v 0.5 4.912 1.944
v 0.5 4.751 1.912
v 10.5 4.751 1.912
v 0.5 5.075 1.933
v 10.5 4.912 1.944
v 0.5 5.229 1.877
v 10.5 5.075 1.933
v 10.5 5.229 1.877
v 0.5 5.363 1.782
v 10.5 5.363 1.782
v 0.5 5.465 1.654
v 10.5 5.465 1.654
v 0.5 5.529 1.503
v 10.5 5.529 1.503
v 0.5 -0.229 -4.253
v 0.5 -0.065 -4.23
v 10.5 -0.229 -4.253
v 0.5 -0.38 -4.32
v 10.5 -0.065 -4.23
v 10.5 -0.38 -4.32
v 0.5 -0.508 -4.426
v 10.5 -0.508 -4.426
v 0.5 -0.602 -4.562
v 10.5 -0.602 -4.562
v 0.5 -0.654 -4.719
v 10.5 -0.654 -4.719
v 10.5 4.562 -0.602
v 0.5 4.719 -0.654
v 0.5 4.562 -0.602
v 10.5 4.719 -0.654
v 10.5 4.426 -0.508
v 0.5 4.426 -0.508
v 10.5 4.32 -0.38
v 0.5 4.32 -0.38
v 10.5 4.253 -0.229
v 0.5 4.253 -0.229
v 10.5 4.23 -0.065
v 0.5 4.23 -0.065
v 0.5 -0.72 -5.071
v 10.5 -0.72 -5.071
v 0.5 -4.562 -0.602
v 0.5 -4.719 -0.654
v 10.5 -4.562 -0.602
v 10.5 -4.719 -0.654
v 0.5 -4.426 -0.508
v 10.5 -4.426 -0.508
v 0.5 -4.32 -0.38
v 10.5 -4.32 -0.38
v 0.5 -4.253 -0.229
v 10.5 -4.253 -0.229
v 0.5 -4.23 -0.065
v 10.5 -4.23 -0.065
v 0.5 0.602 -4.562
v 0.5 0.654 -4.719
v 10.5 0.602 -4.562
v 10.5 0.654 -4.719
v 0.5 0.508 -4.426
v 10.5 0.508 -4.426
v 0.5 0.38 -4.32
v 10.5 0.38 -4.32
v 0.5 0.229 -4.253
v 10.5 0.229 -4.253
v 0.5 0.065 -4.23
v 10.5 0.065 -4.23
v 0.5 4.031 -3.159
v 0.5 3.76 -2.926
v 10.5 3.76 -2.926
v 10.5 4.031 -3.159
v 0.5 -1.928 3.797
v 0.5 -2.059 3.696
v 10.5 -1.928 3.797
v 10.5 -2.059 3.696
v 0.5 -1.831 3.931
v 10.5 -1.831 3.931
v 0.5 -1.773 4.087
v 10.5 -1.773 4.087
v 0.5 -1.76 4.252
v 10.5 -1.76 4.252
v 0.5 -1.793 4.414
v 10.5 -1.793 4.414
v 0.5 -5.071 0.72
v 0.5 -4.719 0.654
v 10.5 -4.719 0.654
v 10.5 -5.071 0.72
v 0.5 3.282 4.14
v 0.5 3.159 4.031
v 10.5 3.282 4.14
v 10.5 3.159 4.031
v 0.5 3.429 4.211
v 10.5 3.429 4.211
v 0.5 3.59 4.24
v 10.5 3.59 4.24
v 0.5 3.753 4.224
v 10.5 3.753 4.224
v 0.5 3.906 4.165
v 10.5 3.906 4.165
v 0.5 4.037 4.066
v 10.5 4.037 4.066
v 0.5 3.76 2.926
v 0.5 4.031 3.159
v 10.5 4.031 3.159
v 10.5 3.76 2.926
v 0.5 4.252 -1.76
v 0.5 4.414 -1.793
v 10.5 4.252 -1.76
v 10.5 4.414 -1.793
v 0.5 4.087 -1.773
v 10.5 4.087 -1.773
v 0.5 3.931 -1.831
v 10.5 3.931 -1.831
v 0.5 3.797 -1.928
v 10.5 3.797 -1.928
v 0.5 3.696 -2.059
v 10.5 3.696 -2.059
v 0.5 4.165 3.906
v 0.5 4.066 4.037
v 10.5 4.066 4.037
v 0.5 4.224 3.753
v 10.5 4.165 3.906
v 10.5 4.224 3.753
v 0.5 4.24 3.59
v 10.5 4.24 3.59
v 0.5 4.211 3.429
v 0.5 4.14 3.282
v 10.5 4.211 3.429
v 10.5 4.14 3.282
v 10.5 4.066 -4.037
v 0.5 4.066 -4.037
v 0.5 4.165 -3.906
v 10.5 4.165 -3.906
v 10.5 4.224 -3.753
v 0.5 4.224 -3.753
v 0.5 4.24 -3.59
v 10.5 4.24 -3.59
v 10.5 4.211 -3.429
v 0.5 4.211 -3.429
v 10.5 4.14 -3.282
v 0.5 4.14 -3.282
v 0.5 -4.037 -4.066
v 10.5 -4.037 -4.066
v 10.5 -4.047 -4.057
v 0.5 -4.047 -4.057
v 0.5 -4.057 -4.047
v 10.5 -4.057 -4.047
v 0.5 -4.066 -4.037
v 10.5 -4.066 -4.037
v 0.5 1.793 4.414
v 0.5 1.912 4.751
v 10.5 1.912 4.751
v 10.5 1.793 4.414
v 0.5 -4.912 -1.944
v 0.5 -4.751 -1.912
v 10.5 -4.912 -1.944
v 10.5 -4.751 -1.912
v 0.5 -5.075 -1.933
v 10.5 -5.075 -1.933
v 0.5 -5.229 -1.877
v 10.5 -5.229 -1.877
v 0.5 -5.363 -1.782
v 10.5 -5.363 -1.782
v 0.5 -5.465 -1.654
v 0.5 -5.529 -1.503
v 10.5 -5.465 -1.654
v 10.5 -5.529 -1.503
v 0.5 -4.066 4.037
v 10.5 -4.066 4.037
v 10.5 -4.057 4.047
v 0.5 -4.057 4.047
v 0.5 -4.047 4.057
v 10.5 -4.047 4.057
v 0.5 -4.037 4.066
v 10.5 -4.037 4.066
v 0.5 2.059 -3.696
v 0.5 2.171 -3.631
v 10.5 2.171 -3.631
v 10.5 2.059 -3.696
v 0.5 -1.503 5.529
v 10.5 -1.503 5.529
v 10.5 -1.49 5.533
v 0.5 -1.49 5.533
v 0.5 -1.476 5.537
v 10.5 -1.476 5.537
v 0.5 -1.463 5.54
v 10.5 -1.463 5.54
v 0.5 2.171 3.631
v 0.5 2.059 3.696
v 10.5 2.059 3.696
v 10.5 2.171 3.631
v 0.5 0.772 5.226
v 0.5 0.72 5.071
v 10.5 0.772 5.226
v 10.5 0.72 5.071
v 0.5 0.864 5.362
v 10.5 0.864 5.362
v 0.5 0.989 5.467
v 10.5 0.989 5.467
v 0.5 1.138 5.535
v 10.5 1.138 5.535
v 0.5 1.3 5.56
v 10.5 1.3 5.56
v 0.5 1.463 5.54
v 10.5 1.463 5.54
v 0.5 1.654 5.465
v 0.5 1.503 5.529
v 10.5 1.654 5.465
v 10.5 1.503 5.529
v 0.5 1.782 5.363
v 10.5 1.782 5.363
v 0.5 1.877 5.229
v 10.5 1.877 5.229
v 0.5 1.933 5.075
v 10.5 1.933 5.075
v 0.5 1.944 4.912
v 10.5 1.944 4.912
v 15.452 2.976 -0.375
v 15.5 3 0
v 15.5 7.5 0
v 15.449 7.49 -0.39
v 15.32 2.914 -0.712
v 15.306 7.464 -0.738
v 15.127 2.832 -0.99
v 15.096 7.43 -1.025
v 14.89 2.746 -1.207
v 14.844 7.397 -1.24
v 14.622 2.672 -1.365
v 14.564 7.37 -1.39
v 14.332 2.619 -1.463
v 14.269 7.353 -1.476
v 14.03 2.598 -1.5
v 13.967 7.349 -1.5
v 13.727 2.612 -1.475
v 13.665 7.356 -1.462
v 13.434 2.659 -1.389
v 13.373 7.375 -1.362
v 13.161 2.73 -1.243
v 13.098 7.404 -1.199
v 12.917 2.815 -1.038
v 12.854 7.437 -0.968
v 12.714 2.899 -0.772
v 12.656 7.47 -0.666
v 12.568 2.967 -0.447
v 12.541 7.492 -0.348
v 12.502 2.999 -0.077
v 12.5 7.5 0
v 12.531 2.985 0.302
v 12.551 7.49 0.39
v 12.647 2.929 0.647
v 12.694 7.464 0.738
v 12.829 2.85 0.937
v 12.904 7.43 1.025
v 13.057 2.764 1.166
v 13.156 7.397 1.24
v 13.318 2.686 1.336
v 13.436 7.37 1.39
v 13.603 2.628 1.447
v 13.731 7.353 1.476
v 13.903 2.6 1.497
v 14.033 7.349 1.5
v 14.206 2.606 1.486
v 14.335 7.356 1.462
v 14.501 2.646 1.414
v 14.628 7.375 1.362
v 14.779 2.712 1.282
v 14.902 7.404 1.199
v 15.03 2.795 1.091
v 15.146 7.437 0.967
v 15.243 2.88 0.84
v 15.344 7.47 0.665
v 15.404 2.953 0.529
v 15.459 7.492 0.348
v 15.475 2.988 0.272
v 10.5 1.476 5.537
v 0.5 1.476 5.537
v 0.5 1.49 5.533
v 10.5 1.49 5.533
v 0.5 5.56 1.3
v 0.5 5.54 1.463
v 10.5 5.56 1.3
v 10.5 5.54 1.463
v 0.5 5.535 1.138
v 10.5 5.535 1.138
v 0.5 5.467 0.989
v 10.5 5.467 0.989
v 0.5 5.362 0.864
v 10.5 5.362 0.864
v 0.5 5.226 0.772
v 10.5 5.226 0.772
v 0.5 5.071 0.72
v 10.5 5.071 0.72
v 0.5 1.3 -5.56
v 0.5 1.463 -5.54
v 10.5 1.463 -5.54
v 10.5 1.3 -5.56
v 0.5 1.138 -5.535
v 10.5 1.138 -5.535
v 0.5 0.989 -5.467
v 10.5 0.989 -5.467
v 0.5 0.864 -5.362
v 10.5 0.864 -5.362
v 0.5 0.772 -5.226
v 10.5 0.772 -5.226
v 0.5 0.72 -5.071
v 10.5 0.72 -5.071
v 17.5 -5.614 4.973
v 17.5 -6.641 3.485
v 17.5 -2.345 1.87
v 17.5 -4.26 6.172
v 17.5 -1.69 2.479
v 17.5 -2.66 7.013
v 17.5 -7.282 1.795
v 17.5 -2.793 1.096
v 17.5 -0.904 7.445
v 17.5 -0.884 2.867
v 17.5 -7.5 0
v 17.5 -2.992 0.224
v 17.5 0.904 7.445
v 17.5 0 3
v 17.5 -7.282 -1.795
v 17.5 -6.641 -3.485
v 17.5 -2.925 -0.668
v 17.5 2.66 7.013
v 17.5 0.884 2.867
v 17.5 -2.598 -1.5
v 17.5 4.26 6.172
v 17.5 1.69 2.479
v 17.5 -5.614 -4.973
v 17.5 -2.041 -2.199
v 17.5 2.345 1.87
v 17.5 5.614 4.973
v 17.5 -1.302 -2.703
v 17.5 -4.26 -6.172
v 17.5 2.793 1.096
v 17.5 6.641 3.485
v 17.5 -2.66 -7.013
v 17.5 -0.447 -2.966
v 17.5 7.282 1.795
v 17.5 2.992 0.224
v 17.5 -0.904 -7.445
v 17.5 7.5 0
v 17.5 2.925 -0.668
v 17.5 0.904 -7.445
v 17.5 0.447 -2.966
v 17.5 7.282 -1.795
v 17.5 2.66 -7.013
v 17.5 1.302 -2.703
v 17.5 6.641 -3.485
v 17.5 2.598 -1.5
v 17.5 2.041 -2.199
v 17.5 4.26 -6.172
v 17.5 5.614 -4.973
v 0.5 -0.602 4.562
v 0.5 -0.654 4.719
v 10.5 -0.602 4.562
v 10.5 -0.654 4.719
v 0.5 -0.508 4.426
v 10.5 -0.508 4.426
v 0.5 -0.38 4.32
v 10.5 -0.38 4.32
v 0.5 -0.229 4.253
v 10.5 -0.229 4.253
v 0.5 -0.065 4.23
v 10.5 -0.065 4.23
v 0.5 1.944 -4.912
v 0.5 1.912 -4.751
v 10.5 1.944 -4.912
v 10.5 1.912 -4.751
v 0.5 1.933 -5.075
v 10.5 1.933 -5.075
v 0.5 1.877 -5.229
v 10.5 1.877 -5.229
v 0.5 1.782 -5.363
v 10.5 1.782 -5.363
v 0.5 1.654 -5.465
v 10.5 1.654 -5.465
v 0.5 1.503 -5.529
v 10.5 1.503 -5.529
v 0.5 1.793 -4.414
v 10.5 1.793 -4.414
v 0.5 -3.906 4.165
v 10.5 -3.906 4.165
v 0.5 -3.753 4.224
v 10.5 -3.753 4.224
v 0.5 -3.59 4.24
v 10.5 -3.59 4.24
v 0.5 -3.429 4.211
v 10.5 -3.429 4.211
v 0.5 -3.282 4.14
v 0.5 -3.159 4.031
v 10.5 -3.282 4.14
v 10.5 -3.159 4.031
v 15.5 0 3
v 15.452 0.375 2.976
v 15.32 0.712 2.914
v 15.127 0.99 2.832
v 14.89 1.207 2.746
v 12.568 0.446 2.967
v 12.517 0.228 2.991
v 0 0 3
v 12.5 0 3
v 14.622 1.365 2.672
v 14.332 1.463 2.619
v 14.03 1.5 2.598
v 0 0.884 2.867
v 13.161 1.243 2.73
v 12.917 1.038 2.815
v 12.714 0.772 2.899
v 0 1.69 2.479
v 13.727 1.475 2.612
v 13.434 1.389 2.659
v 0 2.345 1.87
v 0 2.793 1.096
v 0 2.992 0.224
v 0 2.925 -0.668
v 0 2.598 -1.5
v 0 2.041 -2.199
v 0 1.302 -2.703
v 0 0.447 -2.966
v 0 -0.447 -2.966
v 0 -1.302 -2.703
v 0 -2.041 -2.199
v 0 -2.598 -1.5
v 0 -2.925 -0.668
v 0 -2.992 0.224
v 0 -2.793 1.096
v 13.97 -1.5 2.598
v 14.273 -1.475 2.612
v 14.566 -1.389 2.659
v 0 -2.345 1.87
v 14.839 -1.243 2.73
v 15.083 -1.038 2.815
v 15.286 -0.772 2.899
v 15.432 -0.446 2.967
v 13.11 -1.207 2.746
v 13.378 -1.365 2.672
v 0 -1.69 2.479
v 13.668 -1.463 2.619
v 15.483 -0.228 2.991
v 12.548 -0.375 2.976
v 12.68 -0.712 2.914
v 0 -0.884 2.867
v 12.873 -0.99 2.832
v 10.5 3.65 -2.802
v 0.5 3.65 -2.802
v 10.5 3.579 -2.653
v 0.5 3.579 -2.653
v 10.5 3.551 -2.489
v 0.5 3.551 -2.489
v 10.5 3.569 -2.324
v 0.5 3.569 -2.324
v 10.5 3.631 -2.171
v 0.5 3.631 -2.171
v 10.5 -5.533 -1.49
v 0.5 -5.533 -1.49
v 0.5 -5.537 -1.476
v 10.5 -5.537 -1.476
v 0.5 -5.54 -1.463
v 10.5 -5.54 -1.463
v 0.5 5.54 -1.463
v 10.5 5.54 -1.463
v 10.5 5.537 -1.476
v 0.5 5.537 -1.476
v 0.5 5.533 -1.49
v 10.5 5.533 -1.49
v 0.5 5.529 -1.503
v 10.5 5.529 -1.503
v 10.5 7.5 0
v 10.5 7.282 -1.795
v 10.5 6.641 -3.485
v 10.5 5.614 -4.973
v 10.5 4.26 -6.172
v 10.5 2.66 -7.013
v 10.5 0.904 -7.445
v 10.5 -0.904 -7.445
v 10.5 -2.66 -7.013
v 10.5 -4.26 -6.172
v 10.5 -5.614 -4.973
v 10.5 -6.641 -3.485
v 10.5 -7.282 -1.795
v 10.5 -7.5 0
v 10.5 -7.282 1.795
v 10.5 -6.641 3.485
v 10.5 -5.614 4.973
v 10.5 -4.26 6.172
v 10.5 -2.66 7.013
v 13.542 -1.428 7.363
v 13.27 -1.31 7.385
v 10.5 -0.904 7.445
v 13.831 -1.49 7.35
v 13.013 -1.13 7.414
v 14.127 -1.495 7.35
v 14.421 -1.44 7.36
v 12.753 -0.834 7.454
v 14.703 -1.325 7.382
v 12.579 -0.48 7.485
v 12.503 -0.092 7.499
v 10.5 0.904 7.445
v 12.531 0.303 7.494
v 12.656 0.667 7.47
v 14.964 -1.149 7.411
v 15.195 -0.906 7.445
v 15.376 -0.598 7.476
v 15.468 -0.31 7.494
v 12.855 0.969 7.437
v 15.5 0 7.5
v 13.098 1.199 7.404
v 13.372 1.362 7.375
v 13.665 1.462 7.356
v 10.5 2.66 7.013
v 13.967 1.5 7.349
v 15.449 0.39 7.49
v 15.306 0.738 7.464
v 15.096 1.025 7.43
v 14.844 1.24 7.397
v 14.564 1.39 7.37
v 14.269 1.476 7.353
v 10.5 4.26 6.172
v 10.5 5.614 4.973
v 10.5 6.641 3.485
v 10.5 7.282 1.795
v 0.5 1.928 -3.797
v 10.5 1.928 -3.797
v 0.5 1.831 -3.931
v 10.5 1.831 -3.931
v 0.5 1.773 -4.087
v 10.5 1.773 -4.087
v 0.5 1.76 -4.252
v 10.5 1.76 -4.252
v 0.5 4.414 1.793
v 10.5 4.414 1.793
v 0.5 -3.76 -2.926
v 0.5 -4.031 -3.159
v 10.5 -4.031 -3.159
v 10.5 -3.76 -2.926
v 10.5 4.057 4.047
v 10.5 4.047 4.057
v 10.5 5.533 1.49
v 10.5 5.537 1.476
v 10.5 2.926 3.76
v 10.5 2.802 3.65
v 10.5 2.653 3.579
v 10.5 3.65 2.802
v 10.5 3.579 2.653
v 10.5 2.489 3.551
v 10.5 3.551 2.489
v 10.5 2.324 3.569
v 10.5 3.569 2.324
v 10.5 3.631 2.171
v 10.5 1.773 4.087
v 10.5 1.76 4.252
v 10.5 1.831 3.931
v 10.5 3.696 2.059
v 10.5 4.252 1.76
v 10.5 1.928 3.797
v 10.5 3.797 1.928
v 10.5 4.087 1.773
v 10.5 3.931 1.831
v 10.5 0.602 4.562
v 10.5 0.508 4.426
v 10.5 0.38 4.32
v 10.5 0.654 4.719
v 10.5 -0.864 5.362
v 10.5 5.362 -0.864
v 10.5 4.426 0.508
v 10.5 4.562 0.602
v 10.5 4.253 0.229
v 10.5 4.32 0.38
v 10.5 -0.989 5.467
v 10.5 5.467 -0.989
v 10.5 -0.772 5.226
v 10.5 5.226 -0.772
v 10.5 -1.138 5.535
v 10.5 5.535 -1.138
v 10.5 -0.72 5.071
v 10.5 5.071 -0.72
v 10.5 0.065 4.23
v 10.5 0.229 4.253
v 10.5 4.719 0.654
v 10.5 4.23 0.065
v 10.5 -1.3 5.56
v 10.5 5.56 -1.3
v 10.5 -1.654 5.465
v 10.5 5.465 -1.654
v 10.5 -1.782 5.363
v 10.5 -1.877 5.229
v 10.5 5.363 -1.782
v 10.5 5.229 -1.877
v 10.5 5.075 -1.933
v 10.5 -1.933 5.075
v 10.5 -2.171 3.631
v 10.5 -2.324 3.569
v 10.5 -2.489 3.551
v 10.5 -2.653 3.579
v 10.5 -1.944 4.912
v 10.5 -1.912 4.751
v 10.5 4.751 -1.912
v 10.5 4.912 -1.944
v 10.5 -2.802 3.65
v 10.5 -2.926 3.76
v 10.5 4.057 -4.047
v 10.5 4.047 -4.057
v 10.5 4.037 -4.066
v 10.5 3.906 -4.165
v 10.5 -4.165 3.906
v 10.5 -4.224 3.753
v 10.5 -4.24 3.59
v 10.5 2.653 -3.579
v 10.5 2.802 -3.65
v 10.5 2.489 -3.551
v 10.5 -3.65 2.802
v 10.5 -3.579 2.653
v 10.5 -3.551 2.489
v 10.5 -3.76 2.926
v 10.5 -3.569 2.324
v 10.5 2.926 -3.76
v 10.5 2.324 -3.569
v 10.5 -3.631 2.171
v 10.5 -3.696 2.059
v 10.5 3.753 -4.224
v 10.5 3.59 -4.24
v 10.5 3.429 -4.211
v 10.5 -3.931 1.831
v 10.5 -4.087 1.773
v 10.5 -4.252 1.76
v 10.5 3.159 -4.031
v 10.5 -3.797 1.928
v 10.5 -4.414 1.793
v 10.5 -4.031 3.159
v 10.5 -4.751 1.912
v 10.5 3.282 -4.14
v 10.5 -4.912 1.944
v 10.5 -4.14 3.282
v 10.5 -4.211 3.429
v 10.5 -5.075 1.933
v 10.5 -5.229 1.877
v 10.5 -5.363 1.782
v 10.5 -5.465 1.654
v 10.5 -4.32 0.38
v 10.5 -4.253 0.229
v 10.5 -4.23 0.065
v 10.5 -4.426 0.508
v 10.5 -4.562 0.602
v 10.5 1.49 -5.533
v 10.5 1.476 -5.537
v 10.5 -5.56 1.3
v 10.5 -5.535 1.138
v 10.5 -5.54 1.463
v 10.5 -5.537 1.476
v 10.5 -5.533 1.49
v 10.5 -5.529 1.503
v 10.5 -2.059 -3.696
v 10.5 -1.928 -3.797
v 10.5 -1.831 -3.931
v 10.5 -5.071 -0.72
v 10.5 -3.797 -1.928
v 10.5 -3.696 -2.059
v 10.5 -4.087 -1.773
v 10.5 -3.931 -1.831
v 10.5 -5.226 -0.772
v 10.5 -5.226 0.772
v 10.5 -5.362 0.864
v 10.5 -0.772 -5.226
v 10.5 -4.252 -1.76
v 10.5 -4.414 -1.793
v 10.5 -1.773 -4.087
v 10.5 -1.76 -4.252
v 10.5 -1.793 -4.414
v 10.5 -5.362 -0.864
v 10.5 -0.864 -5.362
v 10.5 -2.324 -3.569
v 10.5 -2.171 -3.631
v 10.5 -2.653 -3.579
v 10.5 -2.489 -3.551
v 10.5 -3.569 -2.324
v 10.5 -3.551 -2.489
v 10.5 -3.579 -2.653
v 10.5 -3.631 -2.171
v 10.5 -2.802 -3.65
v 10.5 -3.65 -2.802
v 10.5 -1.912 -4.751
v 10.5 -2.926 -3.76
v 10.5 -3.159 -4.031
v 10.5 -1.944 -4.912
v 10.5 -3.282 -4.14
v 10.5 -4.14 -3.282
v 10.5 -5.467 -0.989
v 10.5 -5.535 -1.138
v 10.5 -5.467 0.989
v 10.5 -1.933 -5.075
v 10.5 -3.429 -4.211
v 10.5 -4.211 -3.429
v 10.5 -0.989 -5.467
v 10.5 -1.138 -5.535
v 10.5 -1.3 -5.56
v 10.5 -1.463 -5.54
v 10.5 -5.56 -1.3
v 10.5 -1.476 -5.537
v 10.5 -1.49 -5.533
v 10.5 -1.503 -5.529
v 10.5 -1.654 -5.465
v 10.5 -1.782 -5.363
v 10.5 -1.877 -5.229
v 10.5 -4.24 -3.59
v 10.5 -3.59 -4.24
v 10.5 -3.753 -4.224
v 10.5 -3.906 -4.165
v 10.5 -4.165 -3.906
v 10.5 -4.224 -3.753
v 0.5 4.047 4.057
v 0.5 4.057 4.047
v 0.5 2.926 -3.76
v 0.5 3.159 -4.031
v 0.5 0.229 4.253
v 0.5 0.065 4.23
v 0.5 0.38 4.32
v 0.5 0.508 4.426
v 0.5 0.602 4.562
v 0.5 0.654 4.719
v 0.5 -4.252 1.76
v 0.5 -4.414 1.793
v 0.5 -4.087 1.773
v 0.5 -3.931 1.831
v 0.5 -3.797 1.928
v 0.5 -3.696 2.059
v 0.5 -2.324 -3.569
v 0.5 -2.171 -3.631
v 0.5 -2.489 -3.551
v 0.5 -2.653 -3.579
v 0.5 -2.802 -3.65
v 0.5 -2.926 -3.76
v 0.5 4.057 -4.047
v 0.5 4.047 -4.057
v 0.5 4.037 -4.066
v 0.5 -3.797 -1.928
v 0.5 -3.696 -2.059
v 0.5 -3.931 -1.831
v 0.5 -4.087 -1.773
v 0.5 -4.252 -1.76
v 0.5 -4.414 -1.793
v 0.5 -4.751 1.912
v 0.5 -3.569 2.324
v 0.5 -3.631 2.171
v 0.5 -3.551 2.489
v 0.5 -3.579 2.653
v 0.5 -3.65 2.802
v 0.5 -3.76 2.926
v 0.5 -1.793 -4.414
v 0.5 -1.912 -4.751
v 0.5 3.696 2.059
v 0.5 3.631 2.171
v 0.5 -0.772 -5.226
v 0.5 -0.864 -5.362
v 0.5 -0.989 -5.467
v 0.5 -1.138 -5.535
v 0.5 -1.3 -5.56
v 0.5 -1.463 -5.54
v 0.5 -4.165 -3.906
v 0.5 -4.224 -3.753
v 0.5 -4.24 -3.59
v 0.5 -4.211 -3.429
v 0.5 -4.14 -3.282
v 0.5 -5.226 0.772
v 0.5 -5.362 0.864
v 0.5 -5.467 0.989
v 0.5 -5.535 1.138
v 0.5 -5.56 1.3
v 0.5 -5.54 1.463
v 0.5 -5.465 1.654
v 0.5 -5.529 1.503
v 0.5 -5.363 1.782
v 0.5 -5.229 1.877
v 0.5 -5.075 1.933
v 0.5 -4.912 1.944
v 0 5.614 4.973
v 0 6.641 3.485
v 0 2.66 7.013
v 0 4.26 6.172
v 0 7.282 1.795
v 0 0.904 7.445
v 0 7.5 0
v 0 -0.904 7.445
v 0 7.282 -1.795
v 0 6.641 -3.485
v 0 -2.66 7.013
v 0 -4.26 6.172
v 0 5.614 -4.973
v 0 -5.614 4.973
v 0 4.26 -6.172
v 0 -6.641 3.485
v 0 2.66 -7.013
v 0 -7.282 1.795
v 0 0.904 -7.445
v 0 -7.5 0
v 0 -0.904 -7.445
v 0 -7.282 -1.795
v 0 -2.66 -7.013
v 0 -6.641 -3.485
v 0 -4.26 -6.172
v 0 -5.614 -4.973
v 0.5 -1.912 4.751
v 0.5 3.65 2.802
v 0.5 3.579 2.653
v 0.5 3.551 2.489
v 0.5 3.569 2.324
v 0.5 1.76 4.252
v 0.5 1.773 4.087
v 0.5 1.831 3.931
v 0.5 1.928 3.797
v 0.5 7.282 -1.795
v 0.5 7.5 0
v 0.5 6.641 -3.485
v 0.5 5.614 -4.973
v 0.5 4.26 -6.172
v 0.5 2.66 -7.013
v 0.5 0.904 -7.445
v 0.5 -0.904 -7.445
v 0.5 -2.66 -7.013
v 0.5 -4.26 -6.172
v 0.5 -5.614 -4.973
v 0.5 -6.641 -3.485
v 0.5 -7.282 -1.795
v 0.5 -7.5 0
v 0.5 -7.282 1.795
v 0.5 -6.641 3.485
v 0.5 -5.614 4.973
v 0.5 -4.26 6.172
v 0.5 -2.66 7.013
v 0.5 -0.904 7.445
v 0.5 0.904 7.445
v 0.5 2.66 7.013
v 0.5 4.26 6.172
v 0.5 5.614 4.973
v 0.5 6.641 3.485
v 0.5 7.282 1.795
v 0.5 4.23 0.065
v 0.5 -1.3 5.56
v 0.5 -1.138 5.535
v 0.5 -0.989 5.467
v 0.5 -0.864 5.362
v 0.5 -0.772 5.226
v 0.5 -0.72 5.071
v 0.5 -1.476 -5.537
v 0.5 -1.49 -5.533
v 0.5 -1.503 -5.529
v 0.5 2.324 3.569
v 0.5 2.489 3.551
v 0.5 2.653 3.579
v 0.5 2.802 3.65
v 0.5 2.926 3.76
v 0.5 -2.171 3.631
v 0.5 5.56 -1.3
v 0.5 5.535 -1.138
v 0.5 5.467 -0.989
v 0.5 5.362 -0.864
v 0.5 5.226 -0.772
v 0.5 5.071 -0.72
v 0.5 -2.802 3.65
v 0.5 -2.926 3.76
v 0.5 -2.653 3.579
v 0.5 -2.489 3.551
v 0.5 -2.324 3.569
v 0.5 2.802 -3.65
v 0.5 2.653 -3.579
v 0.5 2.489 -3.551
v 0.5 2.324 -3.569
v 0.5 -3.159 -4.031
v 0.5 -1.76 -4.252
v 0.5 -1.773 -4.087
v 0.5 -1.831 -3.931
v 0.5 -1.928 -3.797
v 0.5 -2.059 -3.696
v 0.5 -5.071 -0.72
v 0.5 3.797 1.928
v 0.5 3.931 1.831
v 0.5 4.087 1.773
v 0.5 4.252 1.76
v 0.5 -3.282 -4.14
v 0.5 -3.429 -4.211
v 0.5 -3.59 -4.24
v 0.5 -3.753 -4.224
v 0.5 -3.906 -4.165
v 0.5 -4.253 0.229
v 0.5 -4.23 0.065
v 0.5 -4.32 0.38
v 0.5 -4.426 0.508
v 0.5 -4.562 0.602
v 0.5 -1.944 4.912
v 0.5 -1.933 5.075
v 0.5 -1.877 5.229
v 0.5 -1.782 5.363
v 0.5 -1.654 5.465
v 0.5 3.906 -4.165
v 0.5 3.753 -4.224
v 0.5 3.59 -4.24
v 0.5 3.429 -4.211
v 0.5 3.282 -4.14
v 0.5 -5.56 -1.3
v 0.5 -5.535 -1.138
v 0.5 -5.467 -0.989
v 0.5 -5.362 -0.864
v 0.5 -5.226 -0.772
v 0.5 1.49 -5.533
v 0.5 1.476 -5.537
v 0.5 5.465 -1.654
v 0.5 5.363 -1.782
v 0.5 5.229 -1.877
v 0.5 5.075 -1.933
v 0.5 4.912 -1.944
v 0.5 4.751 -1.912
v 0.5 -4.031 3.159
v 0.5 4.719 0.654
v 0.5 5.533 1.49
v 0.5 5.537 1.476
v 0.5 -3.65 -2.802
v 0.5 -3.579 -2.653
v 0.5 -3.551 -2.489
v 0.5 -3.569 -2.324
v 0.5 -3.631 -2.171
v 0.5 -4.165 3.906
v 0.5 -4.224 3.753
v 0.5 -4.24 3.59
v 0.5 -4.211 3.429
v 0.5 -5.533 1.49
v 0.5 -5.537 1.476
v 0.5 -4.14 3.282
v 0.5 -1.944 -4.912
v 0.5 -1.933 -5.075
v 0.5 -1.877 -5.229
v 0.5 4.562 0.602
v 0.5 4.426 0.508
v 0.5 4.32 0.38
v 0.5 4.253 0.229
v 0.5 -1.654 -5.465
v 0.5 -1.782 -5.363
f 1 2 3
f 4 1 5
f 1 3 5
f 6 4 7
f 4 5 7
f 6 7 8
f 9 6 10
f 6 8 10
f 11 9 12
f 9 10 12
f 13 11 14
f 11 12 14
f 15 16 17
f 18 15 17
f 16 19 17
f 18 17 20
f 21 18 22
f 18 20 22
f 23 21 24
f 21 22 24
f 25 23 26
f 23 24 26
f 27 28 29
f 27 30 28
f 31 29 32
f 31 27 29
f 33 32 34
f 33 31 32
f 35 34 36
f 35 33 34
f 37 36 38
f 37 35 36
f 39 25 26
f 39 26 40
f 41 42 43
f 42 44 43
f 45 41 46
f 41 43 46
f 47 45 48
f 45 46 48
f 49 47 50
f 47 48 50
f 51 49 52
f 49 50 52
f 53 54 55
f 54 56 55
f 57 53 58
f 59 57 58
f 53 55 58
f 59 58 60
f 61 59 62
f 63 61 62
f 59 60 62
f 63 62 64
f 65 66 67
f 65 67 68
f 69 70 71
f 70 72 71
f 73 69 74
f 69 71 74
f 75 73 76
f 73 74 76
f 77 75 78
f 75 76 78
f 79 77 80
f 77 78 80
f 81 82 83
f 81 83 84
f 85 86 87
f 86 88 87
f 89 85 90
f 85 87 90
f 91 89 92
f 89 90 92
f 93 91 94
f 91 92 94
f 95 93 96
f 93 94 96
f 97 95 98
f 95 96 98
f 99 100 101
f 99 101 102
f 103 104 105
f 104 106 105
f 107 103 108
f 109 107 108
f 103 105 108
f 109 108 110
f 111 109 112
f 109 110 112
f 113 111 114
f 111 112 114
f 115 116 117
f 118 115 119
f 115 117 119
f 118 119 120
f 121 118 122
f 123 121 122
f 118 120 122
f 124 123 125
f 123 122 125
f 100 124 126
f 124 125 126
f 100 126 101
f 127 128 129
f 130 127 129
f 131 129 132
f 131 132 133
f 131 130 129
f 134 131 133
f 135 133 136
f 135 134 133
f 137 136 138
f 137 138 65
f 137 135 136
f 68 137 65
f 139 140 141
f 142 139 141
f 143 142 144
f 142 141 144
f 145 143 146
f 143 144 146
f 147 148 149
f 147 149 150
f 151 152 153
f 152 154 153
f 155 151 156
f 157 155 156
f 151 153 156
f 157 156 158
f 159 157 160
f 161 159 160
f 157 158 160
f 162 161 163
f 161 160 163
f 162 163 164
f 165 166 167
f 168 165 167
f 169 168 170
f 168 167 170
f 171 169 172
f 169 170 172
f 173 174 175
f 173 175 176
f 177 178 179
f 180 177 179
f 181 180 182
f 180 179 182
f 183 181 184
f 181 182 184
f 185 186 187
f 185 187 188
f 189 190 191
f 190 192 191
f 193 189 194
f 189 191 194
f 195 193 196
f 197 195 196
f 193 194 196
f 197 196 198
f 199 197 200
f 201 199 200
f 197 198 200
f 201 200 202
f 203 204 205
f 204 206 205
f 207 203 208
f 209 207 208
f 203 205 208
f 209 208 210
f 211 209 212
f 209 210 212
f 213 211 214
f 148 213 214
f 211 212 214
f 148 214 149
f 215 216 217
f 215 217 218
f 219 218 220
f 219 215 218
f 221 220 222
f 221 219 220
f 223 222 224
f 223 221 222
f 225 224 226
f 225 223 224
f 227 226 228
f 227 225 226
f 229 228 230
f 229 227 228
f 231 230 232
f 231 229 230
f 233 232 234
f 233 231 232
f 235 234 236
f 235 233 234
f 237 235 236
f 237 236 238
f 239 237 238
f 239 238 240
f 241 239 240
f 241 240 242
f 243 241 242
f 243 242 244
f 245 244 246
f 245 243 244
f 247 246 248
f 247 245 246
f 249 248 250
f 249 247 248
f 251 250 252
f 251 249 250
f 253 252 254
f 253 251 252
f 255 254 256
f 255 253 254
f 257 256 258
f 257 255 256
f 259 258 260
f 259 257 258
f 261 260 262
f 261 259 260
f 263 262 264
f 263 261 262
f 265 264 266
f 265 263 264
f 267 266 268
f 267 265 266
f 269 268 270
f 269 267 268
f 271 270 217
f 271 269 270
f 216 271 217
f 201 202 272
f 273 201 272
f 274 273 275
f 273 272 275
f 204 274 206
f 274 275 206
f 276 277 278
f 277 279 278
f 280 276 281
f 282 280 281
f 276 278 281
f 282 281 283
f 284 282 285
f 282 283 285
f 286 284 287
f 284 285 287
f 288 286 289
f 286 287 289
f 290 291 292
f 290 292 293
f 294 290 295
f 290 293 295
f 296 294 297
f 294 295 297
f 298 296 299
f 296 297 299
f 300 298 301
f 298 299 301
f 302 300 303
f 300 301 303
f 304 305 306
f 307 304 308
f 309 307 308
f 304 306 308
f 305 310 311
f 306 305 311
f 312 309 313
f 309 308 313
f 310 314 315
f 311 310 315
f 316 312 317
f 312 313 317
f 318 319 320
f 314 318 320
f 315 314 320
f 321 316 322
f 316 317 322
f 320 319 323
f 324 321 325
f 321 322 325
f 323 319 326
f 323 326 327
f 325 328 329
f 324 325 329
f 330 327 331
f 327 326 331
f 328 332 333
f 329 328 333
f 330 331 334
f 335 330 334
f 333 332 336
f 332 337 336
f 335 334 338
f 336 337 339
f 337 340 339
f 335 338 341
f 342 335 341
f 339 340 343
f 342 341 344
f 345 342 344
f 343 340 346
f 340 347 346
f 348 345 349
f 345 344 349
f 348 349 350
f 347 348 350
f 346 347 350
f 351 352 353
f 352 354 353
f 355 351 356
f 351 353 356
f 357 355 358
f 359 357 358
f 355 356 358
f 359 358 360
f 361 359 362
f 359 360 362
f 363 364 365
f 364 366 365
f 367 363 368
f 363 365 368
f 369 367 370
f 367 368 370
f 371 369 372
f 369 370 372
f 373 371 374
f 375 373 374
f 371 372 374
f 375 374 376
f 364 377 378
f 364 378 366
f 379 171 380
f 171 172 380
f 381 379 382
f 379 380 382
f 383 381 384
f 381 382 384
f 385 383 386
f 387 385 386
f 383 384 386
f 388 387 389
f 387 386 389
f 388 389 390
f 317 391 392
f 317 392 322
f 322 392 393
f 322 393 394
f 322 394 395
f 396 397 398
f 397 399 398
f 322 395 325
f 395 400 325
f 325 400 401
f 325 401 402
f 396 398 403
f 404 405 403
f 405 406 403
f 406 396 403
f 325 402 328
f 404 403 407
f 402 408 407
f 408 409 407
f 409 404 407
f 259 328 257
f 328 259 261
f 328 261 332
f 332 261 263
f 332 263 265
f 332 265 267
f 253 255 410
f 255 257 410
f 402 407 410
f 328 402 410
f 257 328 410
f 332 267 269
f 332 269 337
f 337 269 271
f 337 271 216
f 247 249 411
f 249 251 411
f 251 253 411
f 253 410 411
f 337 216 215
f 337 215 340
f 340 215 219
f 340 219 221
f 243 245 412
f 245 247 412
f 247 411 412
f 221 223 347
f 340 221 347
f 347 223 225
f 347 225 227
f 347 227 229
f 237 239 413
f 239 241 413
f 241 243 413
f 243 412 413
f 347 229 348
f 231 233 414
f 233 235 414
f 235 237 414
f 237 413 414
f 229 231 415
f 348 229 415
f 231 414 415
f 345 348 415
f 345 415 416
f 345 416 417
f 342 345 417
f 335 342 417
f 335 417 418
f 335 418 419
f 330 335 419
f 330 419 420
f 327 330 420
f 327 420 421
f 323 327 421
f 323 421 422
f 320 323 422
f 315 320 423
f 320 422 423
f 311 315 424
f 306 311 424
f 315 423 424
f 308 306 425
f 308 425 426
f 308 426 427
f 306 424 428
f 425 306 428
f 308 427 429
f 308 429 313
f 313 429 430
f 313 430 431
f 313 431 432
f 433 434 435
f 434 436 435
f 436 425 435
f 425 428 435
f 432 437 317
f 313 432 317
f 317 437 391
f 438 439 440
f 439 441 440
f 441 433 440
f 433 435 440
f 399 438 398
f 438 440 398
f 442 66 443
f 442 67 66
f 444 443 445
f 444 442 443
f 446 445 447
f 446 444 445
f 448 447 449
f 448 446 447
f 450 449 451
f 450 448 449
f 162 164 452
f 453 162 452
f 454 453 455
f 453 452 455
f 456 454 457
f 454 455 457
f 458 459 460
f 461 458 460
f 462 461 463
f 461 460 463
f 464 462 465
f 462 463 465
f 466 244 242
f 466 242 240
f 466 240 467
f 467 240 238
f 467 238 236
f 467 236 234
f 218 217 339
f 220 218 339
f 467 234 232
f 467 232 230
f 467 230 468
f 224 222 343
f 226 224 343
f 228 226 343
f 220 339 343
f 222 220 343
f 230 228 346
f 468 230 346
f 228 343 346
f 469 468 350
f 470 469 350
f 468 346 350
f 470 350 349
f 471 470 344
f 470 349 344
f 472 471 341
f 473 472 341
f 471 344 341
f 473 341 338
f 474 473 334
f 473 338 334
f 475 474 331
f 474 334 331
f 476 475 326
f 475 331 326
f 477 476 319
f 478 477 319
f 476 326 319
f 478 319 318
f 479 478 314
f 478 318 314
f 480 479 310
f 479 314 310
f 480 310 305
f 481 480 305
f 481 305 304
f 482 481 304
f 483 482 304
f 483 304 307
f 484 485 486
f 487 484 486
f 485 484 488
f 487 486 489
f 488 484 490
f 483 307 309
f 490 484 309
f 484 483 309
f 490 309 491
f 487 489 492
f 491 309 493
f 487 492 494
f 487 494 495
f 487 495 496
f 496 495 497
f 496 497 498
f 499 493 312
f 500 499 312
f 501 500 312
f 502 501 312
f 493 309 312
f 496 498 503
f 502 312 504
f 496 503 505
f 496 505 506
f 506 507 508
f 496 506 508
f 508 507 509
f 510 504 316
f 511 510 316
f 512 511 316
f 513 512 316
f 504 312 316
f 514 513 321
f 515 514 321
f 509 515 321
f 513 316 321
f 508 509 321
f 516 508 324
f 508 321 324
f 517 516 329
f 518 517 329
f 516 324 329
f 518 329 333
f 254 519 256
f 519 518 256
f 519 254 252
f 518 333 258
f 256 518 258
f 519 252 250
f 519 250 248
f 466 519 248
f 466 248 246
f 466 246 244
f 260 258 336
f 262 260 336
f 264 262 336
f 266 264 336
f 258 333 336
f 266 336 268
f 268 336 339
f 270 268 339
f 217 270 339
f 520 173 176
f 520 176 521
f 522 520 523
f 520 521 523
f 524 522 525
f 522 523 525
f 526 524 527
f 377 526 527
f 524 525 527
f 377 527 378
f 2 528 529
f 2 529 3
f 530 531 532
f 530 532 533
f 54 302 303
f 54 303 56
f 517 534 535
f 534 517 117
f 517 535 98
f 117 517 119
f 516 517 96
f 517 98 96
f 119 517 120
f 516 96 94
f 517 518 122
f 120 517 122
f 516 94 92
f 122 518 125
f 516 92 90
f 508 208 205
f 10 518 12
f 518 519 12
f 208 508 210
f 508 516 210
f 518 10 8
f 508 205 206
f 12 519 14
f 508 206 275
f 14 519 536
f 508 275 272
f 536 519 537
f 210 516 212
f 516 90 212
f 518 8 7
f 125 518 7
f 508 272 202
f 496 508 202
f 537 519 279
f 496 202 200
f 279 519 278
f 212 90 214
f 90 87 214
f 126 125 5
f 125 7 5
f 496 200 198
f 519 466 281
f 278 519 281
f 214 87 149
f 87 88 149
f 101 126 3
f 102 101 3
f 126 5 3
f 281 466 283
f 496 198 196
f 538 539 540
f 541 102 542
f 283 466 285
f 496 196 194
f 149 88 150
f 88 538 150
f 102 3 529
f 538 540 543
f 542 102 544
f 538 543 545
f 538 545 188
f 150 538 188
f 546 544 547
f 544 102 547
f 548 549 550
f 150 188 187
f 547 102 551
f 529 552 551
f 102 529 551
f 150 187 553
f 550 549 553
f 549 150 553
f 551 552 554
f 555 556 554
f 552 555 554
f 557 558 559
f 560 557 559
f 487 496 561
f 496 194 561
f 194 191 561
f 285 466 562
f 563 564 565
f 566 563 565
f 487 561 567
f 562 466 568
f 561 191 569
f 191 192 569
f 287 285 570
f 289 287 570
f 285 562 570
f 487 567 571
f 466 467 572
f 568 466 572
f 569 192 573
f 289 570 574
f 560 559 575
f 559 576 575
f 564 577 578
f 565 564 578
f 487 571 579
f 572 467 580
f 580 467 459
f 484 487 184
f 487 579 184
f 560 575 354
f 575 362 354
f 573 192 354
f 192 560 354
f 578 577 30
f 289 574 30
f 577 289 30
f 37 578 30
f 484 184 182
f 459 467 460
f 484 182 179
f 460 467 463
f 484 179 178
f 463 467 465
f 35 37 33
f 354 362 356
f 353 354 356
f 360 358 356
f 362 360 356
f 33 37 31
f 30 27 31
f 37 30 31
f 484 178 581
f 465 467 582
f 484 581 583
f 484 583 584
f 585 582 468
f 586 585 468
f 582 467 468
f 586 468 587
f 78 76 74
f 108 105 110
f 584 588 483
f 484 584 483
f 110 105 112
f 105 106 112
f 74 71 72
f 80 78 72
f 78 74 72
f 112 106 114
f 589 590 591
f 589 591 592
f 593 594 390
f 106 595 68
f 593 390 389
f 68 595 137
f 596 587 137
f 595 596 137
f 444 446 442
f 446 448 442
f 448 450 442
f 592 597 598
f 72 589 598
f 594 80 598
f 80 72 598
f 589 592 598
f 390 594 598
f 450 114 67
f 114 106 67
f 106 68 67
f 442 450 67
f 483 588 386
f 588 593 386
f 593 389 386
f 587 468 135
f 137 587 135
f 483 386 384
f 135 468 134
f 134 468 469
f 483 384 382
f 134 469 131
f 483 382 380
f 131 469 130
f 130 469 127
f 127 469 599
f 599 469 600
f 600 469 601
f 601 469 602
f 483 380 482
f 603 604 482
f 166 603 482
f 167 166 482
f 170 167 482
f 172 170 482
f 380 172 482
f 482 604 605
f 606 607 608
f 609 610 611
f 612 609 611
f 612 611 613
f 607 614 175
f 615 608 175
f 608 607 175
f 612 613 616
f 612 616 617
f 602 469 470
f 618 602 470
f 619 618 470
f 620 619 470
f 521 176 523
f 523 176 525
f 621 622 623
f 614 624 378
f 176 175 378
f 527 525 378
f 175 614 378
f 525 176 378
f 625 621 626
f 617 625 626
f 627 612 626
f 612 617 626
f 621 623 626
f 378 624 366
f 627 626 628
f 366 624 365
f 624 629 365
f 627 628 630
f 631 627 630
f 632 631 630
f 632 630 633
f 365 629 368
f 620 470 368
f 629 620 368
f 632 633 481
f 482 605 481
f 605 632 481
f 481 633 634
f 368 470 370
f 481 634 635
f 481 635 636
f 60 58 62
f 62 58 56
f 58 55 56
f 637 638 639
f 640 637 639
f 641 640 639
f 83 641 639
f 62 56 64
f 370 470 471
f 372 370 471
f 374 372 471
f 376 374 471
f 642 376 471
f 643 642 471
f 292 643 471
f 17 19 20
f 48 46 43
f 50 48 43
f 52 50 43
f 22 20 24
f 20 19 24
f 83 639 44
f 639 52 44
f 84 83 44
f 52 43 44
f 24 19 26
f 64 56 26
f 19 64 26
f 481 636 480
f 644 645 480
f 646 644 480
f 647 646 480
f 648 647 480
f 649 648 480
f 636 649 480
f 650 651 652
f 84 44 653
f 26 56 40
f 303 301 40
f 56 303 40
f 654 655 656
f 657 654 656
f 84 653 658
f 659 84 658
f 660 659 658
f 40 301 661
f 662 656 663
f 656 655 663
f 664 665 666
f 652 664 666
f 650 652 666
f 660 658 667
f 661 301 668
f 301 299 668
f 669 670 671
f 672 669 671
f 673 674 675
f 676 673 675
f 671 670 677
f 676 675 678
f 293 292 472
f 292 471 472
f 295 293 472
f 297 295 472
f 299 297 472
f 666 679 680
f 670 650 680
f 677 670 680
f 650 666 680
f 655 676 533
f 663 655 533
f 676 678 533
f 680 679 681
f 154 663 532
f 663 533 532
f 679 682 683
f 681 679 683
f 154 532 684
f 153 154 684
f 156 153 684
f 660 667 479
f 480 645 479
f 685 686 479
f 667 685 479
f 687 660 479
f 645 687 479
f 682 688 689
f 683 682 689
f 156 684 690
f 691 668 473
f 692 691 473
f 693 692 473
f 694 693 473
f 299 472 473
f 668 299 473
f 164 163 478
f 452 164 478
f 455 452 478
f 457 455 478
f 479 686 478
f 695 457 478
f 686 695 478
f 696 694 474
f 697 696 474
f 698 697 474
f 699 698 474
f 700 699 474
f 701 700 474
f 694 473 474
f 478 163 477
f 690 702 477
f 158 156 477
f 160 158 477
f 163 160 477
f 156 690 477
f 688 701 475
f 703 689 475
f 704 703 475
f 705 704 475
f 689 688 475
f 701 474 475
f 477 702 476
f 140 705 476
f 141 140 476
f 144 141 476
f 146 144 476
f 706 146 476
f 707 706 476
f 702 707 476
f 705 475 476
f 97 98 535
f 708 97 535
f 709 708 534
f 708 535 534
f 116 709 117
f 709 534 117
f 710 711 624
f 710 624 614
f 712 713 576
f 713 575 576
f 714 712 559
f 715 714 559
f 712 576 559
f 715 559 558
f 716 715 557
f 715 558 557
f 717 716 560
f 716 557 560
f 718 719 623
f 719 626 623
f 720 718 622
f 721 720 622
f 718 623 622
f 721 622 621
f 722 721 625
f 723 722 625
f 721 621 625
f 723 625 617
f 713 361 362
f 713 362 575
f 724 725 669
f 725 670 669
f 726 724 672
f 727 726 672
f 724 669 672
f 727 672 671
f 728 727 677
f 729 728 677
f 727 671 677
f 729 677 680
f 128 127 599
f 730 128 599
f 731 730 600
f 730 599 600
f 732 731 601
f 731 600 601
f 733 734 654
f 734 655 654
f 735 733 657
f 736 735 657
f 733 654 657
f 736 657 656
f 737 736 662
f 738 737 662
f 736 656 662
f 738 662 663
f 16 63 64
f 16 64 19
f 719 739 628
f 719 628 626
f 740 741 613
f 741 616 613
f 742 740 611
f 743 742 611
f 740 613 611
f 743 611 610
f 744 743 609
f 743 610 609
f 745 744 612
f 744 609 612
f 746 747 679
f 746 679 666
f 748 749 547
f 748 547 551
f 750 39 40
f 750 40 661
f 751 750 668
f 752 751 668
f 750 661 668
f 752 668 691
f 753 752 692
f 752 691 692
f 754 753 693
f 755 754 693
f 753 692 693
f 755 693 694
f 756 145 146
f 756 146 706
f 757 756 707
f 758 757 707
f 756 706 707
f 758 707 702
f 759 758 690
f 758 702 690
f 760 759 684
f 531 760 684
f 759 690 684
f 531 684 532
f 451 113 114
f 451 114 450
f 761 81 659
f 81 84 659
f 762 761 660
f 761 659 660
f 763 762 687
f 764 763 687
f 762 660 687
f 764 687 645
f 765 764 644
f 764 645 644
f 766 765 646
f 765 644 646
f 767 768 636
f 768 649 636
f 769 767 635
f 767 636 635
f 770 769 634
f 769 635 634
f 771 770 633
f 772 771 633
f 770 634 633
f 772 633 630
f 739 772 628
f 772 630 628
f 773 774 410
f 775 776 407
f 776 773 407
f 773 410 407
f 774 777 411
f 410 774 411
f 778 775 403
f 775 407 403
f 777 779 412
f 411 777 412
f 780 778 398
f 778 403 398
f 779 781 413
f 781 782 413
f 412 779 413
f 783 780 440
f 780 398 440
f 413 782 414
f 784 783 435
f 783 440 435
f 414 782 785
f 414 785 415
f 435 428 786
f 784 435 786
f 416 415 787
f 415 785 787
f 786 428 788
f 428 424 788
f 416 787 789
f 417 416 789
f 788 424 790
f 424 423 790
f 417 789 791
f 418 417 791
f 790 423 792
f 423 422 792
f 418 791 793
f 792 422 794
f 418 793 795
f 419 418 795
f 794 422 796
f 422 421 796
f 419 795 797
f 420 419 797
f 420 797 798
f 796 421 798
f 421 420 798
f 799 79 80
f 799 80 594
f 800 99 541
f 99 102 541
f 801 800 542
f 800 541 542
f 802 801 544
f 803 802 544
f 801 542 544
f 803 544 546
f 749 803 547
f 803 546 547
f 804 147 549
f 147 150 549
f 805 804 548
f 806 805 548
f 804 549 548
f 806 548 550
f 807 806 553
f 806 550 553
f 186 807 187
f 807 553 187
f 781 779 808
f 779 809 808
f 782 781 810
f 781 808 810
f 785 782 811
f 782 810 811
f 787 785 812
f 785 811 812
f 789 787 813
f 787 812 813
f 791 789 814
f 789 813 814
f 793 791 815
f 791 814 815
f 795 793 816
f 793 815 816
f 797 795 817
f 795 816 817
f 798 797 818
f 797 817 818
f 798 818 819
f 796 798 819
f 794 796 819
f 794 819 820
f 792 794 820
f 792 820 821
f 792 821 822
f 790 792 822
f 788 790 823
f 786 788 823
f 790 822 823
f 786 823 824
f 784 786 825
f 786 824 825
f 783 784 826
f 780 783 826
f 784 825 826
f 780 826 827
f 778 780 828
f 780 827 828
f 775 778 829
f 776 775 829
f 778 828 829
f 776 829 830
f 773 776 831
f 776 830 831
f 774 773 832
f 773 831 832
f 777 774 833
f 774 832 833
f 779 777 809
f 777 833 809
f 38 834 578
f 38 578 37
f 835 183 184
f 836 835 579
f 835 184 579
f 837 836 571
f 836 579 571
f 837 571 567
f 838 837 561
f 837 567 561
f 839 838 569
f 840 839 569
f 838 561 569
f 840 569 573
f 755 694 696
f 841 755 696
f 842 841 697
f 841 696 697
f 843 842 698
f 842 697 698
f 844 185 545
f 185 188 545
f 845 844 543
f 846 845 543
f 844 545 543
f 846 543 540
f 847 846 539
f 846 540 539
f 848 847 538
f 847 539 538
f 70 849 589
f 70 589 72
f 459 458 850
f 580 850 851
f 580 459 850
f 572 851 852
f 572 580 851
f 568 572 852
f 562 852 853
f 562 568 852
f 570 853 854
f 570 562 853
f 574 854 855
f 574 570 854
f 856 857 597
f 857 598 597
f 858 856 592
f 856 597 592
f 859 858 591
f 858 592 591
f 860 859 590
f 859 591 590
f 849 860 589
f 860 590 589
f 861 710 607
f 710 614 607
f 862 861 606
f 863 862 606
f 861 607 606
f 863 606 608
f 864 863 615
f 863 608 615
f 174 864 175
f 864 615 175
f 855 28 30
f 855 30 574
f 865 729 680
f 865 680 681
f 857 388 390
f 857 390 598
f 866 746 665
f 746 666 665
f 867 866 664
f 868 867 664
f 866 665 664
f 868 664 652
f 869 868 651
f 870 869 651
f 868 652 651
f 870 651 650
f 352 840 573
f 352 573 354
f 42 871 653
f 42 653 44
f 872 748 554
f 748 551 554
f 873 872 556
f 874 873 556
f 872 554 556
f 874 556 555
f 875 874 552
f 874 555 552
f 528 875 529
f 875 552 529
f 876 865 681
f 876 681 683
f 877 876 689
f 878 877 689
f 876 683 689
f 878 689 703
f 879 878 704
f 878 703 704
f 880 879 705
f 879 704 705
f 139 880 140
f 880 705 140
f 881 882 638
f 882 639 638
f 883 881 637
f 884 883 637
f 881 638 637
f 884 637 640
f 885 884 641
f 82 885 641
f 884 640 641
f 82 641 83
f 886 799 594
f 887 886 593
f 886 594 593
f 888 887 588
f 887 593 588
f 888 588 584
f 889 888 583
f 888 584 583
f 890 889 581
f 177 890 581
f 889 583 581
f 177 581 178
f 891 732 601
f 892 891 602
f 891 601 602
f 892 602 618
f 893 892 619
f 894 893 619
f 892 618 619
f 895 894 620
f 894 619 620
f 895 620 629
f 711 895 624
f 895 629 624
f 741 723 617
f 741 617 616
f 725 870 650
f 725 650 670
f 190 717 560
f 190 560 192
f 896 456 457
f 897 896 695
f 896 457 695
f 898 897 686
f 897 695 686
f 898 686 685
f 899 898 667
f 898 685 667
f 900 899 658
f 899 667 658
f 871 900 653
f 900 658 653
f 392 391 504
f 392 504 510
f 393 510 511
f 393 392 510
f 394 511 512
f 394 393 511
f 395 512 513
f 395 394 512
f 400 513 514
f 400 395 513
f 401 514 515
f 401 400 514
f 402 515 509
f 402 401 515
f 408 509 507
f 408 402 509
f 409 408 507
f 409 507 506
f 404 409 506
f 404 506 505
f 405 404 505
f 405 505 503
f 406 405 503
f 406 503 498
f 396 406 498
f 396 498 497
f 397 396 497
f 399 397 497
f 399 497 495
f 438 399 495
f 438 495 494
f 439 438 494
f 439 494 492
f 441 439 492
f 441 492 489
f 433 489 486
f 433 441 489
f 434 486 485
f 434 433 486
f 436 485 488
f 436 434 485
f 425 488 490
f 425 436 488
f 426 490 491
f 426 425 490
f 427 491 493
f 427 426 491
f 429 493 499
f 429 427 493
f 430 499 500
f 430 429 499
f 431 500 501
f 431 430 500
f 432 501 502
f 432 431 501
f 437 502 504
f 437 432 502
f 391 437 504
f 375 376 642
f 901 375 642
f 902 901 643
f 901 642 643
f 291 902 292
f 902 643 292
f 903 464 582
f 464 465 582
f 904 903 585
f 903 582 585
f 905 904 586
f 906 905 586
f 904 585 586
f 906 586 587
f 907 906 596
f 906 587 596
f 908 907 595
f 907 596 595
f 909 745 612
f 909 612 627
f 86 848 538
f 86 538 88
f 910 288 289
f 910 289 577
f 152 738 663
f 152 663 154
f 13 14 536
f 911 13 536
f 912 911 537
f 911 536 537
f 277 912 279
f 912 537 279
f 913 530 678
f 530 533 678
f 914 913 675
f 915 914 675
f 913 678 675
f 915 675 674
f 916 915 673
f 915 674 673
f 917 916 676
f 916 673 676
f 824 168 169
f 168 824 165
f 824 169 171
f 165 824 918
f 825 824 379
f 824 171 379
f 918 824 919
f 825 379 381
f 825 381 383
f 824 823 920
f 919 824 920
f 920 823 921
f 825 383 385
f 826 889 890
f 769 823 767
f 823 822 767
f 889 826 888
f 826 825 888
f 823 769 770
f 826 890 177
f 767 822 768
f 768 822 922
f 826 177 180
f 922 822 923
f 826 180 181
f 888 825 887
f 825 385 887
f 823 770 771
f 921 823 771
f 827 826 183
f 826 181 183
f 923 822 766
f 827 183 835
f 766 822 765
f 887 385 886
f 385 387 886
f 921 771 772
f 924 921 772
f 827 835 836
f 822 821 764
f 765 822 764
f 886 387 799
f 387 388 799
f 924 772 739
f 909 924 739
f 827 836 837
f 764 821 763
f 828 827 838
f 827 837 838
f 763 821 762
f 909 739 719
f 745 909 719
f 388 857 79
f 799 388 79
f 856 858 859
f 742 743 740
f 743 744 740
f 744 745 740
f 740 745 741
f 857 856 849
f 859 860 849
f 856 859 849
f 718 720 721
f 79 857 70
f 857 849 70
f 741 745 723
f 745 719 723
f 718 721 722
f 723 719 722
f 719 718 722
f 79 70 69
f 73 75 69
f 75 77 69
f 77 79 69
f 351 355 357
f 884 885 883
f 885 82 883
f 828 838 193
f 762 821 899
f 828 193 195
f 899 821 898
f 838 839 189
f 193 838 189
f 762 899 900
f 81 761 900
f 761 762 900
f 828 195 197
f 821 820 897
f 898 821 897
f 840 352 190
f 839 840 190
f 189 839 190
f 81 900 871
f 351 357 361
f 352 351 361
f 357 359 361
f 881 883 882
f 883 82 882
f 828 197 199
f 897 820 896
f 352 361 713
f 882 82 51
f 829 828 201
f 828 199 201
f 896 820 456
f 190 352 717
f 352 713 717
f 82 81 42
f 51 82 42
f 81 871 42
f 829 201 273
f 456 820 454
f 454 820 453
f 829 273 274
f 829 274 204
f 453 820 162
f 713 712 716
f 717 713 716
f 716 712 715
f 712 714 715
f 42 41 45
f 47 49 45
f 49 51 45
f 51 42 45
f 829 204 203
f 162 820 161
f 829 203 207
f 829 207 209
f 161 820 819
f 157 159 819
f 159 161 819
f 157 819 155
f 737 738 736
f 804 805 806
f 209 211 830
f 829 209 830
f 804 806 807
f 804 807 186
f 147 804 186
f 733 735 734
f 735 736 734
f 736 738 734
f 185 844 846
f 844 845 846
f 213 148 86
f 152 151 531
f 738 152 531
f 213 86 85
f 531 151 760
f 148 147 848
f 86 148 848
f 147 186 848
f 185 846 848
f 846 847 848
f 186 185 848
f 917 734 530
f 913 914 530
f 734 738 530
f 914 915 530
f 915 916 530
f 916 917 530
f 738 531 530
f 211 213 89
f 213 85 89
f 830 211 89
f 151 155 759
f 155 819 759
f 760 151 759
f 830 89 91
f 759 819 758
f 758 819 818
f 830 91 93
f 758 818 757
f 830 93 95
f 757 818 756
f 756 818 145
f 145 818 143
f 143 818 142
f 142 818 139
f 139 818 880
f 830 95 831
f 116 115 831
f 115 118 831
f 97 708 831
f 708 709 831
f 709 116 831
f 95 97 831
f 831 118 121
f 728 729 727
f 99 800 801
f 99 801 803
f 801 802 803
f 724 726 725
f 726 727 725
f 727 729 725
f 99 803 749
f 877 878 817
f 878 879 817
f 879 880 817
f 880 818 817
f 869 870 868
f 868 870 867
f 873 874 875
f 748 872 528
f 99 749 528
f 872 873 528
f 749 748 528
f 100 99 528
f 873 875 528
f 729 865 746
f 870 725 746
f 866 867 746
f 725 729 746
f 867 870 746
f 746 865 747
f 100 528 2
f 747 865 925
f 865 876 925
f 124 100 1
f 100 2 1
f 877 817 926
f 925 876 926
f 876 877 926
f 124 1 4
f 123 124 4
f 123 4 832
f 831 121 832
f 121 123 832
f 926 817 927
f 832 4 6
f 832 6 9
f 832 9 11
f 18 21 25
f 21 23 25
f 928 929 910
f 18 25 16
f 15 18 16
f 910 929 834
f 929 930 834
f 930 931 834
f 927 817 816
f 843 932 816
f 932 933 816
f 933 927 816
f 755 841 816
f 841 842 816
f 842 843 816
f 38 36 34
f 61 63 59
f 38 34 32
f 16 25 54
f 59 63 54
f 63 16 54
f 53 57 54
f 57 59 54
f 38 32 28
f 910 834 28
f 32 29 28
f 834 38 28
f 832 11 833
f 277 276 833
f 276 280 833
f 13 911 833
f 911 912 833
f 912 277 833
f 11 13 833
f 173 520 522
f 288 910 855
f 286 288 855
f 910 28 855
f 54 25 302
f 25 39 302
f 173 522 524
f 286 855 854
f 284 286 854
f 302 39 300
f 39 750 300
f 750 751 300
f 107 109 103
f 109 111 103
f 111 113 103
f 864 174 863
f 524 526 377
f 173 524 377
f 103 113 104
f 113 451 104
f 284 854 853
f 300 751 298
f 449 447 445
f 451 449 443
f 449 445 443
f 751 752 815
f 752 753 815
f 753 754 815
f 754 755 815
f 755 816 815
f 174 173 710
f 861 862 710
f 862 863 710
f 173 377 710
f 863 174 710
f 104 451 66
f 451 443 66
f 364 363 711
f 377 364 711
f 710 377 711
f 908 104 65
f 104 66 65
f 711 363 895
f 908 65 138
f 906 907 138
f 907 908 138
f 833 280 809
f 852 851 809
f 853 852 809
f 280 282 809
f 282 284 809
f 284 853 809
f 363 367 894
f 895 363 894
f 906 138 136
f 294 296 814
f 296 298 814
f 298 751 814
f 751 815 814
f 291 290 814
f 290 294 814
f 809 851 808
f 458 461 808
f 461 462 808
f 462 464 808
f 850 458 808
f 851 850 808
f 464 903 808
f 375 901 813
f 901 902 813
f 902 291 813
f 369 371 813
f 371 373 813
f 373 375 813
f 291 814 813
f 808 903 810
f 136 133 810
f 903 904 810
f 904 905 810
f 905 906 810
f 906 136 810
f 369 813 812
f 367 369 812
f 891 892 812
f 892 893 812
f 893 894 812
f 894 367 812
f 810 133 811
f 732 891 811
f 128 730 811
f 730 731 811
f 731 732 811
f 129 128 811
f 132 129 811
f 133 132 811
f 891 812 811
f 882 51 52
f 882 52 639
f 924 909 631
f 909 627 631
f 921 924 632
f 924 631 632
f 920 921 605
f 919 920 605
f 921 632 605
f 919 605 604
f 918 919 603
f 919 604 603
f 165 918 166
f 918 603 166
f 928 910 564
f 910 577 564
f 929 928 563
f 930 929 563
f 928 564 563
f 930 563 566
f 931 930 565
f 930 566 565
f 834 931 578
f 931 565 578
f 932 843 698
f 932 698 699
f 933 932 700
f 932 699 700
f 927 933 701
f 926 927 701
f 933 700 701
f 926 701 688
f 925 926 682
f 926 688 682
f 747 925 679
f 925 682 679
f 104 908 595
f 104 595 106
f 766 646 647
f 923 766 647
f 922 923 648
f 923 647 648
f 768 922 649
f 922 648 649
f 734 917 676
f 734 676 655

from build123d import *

# Parameters (mm, degrees)
SKETCH3_R                = 3
CUT_EXTRUDE1_DEPTH       = 18.5
SKETCH5_R                = 1.5
CUT_EXTRUDE3_DEPTH       = 10
CIRPATTERN1_COUNT        = 2
CIRPATTERN1_ANGLE        = 90
CUT_EXTRUDE2_DEPTH       = 10
FILLET1_R                = 0.6
CIRPATTERN2_COUNT        = 12
FILLET1_OF_CIRPATTERN2_R = 0.6


with BuildPart() as part:
    # Sketch2 → Revolve1 (revolve)
    with BuildSketch(Plane.XY):
        Polygon((0, 0), (0, 7.5), (0.5, 7.5), (0.5, 5.73), (10.5, 5.73), (10.5, 7.5), (17.5, 7.5), (17.5, 0), align=None)
    revolve(axis=Axis((19.21222629, 0, 0), (-1, 0, 0)))

    # Sketch3 → Cut-Extrude1 (cut, through all)
    with BuildSketch(Plane.ZY):
        Circle(SKETCH3_R)
    extrude(amount=-CUT_EXTRUDE1_DEPTH, mode=Mode.SUBTRACT)

    # Sketch5 → Cut-Extrude3 (cut)
    with BuildSketch(Plane(origin=(0, 0, 0), x_dir=(1, 0, 0), z_dir=(0, 1, 0))):
        with Locations((14, 0)):
            Circle(SKETCH5_R)
    cut_extrude3 = extrude(amount=CUT_EXTRUDE3_DEPTH, mode=Mode.SUBTRACT)

    # CirPattern1: Cut-Extrude3 ×2 about axis
    cirpattern1_axis = Axis((19.21222629, 0, 0), (1, 0, 0))
    for i in range(1, CIRPATTERN1_COUNT):
        add(cut_extrude3.rotate(cirpattern1_axis, i * CIRPATTERN1_ANGLE / (CIRPATTERN1_COUNT - 1)), mode=Mode.SUBTRACT)

    # Sketch4 → Cut-Extrude2 (cut)
    with BuildSketch(Plane(origin=(0.5, 0, 0), x_dir=(0, 0, -1), z_dir=(1, 0, 0))):
        Polygon((1.125, 7.23), (-1.125, 7.23), (-0.5625, 4.23), (0.5625, 4.23), align=None)
    cut_extrude2 = extrude(amount=CUT_EXTRUDE2_DEPTH, mode=Mode.SUBTRACT)

    # Fillet1
    fillet1_edges = [part.edges().sort_by_distance(p)[0] for p in [
        (5.5, 5.669222732, -0.832354262),
        (5.5, 4.23, -0.5625),
        (5.5, 5.669222732, 0.832354262),
        (5.5, 4.23, 0.5625),
    ]]
    fillet(fillet1_edges, radius=FILLET1_R)

    # CirPattern2: Cut-Extrude2 ×12 about axis
    cirpattern2_axis = Axis((0, 0, 0), (1, 0, 0))
    for i in range(1, CIRPATTERN2_COUNT):
        add(cut_extrude2.rotate(cirpattern2_axis, i * 360 / CIRPATTERN2_COUNT), mode=Mode.SUBTRACT)

    # Fillet1 of CirPattern2
    fillet1_of_cirpattern2_edges = [part.edges().sort_by_distance(p)[0] for p in [
        (5.5, 5.325868037, 2.11377143),
        (5.5, 3.944537458, 1.62786071),
        (5.5, 4.493513774, 3.555451302),
        (5.5, 3.382037458, 2.60213929),
        (5.5, 3.555451302, 4.493513774),
        (5.5, 2.60213929, 3.382037458),
        (5.5, 2.11377143, 5.325868037),
        (5.5, 1.62786071, 3.944537458),
        (5.5, 0.832354262, 5.669222732),
        (5.5, 0.5625, 4.23),
        (5.5, -0.832354262, 5.669222732),
        (5.5, -0.5625, 4.23),
        (5.5, -2.11377143, 5.325868037),
        (5.5, -1.62786071, 3.944537458),
        (5.5, -3.555451302, 4.493513774),
        (5.5, -2.60213929, 3.382037458),
        (5.5, -4.493513774, 3.555451302),
        (5.5, -3.382037458, 2.60213929),
        (5.5, -5.325868037, 2.11377143),
        (5.5, -3.944537458, 1.62786071),
        (5.5, -5.669222732, 0.832354262),
        (5.5, -4.23, 0.5625),
        (5.5, -5.669222732, -0.832354262),
        (5.5, -4.23, -0.5625),
        (5.5, -5.325868037, -2.11377143),
        (5.5, -3.944537458, -1.62786071),
        (5.5, -4.493513774, -3.555451302),
        (5.5, -3.382037458, -2.60213929),
        (5.5, -3.555451302, -4.493513774),
        (5.5, -2.60213929, -3.382037458),
        (5.5, -2.11377143, -5.325868037),
        (5.5, -1.62786071, -3.944537458),
        (5.5, -0.832354262, -5.669222732),
        (5.5, -0.5625, -4.23),
        (5.5, 0.832354262, -5.669222732),
        (5.5, 0.5625, -4.23),
        (5.5, 2.11377143, -5.325868037),
        (5.5, 1.62786071, -3.944537458),
        (5.5, 3.555451302, -4.493513774),
        (5.5, 2.60213929, -3.382037458),
        (5.5, 4.493513774, -3.555451302),
        (5.5, 3.382037458, -2.60213929),
        (5.5, 5.325868037, -2.11377143),
        (5.5, 3.944537458, -1.62786071),
    ]]
    fillet(fillet1_of_cirpattern2_edges, radius=FILLET1_OF_CIRPATTERN2_R)


solid = part.part
